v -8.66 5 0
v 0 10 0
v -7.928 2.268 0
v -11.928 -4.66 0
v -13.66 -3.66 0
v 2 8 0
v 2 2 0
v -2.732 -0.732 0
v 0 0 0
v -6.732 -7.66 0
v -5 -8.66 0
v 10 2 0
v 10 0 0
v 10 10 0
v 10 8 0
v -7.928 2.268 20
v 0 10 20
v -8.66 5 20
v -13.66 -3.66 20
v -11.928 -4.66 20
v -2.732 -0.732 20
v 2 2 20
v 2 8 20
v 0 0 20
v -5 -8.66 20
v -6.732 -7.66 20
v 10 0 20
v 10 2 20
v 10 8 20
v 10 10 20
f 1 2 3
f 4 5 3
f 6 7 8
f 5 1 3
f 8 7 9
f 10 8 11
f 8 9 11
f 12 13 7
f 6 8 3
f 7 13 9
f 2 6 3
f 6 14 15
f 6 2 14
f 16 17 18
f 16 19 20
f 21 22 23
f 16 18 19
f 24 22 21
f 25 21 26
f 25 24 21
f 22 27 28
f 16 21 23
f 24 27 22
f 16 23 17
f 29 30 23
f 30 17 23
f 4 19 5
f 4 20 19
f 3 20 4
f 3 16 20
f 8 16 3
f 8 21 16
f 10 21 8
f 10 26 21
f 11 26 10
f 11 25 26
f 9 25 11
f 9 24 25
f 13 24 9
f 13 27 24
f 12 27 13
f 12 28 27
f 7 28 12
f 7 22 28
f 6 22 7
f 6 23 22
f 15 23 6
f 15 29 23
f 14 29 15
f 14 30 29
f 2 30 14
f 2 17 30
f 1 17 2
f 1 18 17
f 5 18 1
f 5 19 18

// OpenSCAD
l = 10;
h = 10;
t = 2;

module grip () {
    difference() {
        square([h, l]);
        translate([t, t, 0]) 
            square([h - t, l - (t * 2)]);
    }
}

module middle (a) {
    x = -(l*cos(a));
    y = (l*sin(a));
    polygon(points = [
        [0,0],
        [0,l],
        [x,y],
    ]);
}

module holder (w, a) {
    linear_extrude(w) {
        grip();
        mirror([1,1,0])
        rotate(a + 90) {
            grip();
        }
        middle(a + 90);
    }
}

holder(w = 20, a = -60); //hex
*holder(w = 20, a = -90); //top
*holder(w = 200, a = -90); //side
